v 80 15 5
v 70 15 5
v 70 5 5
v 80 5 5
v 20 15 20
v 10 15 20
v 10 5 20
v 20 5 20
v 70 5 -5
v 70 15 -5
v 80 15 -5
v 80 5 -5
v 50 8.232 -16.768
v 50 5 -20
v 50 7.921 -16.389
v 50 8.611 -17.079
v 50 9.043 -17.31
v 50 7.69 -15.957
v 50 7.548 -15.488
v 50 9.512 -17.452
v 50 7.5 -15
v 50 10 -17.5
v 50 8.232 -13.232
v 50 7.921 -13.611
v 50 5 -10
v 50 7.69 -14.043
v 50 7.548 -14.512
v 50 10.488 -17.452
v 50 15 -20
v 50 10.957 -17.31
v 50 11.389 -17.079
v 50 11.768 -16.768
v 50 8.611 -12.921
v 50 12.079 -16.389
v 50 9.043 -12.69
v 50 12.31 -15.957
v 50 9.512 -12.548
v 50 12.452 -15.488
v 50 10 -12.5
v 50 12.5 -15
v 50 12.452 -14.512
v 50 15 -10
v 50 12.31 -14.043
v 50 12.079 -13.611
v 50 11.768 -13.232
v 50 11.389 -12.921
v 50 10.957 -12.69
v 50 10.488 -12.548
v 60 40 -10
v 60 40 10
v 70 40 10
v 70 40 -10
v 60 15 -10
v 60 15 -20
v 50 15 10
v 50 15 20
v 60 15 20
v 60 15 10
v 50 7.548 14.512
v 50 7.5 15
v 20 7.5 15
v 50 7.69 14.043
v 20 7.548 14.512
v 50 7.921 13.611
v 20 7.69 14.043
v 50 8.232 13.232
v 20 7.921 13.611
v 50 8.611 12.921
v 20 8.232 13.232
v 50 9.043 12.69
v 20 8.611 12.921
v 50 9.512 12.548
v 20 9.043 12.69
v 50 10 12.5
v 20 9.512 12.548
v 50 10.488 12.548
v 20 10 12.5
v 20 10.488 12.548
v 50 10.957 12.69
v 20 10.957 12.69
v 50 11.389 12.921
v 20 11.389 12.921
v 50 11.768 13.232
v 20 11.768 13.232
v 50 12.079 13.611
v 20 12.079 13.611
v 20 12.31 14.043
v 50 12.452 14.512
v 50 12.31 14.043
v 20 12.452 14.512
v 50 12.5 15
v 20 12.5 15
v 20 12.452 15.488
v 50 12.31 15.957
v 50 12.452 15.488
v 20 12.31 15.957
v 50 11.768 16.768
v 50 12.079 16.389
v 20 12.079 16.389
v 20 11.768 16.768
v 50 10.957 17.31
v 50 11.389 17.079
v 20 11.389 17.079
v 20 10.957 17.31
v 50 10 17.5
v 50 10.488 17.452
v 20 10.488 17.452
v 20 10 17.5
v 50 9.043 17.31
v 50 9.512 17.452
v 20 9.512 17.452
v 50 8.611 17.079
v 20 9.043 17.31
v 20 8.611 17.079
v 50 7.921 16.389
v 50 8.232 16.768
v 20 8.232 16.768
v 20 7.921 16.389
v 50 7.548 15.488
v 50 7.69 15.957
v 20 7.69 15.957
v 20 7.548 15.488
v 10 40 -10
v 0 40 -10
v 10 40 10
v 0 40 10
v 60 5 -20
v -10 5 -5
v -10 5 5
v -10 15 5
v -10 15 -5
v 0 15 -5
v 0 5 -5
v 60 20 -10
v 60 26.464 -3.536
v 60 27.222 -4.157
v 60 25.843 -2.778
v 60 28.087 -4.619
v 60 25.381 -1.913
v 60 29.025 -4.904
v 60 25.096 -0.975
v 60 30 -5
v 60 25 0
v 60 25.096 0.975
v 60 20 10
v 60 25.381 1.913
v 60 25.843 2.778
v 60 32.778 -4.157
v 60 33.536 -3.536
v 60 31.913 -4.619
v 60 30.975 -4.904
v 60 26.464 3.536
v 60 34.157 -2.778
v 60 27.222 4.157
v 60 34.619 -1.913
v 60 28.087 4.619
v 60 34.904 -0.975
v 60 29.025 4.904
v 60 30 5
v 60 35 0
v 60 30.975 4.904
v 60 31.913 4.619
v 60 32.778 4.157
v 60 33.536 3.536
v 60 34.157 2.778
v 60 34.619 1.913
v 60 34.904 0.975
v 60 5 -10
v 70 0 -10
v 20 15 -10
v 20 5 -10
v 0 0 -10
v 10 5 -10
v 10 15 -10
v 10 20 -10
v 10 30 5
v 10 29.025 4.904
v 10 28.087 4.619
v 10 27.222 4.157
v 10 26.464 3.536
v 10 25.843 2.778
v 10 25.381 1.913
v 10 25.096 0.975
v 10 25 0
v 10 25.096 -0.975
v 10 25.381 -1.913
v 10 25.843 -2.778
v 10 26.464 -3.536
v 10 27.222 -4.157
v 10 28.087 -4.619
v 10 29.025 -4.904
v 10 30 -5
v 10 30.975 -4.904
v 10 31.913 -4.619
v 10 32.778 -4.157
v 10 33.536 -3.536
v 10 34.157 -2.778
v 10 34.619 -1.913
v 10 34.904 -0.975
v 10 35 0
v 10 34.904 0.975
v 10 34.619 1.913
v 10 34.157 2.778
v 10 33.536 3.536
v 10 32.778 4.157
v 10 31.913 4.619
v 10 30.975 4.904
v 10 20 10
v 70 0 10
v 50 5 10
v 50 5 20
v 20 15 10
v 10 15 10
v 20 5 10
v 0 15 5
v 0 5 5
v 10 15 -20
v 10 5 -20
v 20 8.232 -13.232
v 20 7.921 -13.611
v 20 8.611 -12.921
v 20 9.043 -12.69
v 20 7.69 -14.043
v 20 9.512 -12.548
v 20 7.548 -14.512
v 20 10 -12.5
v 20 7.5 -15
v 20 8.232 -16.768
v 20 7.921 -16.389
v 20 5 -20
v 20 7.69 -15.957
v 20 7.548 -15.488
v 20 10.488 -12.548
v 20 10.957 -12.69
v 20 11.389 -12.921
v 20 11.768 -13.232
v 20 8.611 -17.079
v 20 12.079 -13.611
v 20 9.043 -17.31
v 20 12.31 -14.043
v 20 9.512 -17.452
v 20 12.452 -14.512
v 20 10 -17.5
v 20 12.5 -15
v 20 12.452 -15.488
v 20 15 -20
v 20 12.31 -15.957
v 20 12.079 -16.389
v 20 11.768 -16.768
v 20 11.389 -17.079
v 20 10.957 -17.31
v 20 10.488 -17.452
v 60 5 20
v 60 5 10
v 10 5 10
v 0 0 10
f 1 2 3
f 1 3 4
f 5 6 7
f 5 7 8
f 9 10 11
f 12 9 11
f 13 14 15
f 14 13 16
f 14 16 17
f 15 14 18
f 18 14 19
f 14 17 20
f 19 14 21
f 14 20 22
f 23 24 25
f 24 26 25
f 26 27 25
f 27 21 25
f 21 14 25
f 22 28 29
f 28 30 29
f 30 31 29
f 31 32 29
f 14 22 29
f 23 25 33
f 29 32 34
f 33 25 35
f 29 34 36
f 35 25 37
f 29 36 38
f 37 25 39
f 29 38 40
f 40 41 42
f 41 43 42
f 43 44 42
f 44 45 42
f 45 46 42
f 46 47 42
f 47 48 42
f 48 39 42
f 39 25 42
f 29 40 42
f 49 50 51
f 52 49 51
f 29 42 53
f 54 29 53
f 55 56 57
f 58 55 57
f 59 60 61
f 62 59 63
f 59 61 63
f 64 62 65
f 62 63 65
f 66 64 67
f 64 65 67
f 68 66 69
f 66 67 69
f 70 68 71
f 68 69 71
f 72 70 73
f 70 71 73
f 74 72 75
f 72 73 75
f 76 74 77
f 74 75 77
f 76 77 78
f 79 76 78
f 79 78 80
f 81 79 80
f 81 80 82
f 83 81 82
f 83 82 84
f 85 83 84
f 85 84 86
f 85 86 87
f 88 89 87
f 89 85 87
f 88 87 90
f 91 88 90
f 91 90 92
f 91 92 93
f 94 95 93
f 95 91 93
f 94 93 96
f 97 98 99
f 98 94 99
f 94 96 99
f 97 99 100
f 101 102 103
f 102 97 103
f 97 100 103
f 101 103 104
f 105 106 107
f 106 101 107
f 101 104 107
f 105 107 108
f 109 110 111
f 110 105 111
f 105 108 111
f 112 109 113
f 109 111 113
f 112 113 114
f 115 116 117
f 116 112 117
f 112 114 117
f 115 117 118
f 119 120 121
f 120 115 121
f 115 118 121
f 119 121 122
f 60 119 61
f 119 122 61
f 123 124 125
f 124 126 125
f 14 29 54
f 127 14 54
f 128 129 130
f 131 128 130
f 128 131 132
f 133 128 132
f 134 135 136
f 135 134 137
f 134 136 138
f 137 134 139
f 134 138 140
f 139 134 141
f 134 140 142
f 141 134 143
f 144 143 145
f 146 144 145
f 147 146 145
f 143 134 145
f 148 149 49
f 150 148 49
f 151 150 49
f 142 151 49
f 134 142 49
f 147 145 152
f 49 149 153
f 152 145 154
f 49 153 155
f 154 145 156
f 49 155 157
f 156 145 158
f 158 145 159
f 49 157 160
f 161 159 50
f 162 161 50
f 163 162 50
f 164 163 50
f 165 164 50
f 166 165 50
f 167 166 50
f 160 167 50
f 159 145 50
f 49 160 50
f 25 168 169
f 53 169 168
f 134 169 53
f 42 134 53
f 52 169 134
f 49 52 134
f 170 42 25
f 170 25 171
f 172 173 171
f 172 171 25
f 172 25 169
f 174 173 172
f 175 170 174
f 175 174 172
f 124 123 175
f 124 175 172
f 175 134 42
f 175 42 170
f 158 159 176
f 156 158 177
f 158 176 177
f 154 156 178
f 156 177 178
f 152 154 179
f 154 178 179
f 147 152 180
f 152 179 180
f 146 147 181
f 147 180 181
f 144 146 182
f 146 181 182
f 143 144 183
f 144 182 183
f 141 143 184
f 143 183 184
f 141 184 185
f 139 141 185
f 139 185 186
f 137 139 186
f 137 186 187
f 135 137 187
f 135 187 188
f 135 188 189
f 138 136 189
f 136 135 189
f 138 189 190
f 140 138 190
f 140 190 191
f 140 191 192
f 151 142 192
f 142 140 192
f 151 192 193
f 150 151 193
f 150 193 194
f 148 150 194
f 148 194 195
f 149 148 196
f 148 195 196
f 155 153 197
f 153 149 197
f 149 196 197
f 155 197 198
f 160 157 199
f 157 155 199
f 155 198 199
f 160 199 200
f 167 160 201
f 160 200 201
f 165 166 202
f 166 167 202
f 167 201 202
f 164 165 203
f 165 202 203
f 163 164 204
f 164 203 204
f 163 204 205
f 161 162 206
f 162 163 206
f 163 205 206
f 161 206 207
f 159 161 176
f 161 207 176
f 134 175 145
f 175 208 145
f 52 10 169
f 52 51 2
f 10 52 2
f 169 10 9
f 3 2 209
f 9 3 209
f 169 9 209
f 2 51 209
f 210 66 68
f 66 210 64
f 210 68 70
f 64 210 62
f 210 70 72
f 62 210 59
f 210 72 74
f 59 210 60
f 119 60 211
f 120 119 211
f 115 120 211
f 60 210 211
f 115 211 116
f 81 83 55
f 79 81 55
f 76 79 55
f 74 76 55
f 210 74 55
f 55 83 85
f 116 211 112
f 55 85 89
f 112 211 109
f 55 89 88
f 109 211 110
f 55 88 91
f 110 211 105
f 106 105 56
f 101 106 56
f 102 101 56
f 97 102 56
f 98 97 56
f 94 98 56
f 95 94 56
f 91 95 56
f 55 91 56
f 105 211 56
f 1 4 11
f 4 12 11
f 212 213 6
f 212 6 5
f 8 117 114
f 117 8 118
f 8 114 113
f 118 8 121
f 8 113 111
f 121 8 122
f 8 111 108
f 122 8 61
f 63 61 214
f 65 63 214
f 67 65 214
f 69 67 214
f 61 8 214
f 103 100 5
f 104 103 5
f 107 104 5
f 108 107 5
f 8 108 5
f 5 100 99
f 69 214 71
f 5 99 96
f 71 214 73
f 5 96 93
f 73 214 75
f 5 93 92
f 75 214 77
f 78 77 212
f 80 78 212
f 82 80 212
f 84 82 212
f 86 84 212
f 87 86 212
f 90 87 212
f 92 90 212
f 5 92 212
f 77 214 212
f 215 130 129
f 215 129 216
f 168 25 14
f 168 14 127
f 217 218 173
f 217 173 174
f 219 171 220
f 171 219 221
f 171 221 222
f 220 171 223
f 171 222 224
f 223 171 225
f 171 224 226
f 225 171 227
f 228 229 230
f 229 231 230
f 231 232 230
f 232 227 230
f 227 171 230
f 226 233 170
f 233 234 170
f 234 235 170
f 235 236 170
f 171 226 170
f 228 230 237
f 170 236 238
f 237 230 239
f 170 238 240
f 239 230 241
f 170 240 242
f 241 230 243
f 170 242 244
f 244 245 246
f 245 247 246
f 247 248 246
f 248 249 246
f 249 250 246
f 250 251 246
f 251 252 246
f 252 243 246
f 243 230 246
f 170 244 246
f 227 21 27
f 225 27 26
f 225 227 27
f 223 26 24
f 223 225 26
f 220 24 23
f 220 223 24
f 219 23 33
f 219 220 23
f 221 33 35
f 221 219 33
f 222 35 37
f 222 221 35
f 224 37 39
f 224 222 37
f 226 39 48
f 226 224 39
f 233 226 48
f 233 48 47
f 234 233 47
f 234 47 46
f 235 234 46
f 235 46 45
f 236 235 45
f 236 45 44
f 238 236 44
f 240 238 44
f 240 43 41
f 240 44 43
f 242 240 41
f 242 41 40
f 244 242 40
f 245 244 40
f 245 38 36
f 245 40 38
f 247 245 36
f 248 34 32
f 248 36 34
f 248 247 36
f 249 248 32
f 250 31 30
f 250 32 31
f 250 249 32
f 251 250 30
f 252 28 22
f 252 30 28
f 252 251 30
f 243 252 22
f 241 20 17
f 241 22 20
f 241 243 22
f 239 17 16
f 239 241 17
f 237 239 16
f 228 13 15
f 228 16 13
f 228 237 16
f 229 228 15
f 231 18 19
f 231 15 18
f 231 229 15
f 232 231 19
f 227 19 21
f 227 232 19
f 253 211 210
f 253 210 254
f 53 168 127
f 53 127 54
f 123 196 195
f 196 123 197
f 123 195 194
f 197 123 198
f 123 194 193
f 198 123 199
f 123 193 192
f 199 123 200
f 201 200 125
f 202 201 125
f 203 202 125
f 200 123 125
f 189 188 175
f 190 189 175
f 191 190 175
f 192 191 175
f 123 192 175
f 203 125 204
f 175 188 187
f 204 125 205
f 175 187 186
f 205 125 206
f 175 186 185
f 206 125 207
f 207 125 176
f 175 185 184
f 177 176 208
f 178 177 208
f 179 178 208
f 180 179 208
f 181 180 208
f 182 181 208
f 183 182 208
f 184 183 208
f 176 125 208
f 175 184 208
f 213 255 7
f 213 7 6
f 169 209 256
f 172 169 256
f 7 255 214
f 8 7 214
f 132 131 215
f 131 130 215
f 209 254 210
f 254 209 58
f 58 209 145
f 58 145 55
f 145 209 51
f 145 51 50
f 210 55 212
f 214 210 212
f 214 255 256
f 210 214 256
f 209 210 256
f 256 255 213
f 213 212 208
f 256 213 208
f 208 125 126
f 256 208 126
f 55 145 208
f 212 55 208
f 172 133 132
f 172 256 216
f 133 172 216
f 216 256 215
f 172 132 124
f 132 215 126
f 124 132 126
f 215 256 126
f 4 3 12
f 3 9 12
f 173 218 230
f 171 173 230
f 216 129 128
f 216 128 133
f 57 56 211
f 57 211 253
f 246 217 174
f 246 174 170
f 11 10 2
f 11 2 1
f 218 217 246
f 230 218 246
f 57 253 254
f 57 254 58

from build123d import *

# Parameters (mm, degrees)
SKETCH1_W           = 10
SKETCH1_H           = 10
BOSS_EXTRUDE1_DEPTH = 10
SKETCH1_3_W         = 10
SKETCH1_3_H         = 10
BOSS_EXTRUDE2_DEPTH = 5
SKETCH1_4_W         = 10
SKETCH1_4_H         = 10
BOSS_EXTRUDE3_DEPTH = 20
BOSS_EXTRUDE4_REACH = 85.066
SKETCH2_R           = 5
BOSS_EXTRUDE5_REACH = 76.833
SKETCH3_R           = 2.5


with BuildPart() as part:
    # Sketch1 → Boss-Extrude1 (new, symmetric)
    with BuildSketch(Plane.XY):
        Polygon((0, 5), (0, 0), (70, 0), (70, 5), (70, 15), (70, 40), (60, 40), (60, 20), (10, 20), (10, 40), (0, 40), (0, 15), align=None)
        with Locations((15, 10)):
            Rectangle(SKETCH1_W, SKETCH1_H, mode=Mode.SUBTRACT)
        with Locations((55, 10)):
            Rectangle(SKETCH1_W, SKETCH1_H, mode=Mode.SUBTRACT)
    extrude(amount=BOSS_EXTRUDE1_DEPTH, both=True)

    # Sketch1<3> → Boss-Extrude2 (add, symmetric)
    with BuildSketch(Plane.XY):
        with Locations((-5, 10)):
            Rectangle(SKETCH1_3_W, SKETCH1_3_H)
        with Locations((75, 10)):
            Rectangle(SKETCH1_3_W, SKETCH1_3_H)
    extrude(amount=BOSS_EXTRUDE2_DEPTH, both=True)

    # Sketch1<4> → Boss-Extrude3 (add, symmetric)
    with BuildSketch(Plane.XY):
        with Locations((15, 10)):
            Rectangle(SKETCH1_4_W, SKETCH1_4_H)
        with Locations((55, 10)):
            Rectangle(SKETCH1_4_W, SKETCH1_4_H)
    extrude(amount=BOSS_EXTRUDE3_DEPTH, both=True)

    # Sketch2 → Boss-Extrude4 (add, up to next)
    with BuildSketch(Plane(origin=(10, 0, 0), x_dir=(0, 0, -1), z_dir=(1, 0, 0)), mode=Mode.PRIVATE) as boss_extrude4_sk1:
        with Locations((0, 30)):
            Circle(SKETCH2_R)
    boss_extrude4_tool1 = extrude(boss_extrude4_sk1.sketch, amount=BOSS_EXTRUDE4_REACH, mode=Mode.PRIVATE) - part.part
    add(boss_extrude4_tool1.solids().sort_by_distance((10, 30, 0))[0])

    # Sketch3 → Boss-Extrude5 (add, up to next)
    with BuildSketch(Plane(origin=(20, 0, 0), x_dir=(0, 0, -1), z_dir=(1, 0, 0)), mode=Mode.PRIVATE) as boss_extrude5_sk1:
        with Locations((-15, 10)):
            Circle(SKETCH3_R)
    boss_extrude5_tool1 = extrude(boss_extrude5_sk1.sketch, amount=BOSS_EXTRUDE5_REACH, mode=Mode.PRIVATE) - part.part
    boss_extrude5 = boss_extrude5_tool1.solids().sort_by_distance((20, 10, 15))[0]
    add(boss_extrude5)

    # Mirror1: Boss-Extrude5 across plane
    add(boss_extrude5.mirror(Plane.XY))


solid = part.part
